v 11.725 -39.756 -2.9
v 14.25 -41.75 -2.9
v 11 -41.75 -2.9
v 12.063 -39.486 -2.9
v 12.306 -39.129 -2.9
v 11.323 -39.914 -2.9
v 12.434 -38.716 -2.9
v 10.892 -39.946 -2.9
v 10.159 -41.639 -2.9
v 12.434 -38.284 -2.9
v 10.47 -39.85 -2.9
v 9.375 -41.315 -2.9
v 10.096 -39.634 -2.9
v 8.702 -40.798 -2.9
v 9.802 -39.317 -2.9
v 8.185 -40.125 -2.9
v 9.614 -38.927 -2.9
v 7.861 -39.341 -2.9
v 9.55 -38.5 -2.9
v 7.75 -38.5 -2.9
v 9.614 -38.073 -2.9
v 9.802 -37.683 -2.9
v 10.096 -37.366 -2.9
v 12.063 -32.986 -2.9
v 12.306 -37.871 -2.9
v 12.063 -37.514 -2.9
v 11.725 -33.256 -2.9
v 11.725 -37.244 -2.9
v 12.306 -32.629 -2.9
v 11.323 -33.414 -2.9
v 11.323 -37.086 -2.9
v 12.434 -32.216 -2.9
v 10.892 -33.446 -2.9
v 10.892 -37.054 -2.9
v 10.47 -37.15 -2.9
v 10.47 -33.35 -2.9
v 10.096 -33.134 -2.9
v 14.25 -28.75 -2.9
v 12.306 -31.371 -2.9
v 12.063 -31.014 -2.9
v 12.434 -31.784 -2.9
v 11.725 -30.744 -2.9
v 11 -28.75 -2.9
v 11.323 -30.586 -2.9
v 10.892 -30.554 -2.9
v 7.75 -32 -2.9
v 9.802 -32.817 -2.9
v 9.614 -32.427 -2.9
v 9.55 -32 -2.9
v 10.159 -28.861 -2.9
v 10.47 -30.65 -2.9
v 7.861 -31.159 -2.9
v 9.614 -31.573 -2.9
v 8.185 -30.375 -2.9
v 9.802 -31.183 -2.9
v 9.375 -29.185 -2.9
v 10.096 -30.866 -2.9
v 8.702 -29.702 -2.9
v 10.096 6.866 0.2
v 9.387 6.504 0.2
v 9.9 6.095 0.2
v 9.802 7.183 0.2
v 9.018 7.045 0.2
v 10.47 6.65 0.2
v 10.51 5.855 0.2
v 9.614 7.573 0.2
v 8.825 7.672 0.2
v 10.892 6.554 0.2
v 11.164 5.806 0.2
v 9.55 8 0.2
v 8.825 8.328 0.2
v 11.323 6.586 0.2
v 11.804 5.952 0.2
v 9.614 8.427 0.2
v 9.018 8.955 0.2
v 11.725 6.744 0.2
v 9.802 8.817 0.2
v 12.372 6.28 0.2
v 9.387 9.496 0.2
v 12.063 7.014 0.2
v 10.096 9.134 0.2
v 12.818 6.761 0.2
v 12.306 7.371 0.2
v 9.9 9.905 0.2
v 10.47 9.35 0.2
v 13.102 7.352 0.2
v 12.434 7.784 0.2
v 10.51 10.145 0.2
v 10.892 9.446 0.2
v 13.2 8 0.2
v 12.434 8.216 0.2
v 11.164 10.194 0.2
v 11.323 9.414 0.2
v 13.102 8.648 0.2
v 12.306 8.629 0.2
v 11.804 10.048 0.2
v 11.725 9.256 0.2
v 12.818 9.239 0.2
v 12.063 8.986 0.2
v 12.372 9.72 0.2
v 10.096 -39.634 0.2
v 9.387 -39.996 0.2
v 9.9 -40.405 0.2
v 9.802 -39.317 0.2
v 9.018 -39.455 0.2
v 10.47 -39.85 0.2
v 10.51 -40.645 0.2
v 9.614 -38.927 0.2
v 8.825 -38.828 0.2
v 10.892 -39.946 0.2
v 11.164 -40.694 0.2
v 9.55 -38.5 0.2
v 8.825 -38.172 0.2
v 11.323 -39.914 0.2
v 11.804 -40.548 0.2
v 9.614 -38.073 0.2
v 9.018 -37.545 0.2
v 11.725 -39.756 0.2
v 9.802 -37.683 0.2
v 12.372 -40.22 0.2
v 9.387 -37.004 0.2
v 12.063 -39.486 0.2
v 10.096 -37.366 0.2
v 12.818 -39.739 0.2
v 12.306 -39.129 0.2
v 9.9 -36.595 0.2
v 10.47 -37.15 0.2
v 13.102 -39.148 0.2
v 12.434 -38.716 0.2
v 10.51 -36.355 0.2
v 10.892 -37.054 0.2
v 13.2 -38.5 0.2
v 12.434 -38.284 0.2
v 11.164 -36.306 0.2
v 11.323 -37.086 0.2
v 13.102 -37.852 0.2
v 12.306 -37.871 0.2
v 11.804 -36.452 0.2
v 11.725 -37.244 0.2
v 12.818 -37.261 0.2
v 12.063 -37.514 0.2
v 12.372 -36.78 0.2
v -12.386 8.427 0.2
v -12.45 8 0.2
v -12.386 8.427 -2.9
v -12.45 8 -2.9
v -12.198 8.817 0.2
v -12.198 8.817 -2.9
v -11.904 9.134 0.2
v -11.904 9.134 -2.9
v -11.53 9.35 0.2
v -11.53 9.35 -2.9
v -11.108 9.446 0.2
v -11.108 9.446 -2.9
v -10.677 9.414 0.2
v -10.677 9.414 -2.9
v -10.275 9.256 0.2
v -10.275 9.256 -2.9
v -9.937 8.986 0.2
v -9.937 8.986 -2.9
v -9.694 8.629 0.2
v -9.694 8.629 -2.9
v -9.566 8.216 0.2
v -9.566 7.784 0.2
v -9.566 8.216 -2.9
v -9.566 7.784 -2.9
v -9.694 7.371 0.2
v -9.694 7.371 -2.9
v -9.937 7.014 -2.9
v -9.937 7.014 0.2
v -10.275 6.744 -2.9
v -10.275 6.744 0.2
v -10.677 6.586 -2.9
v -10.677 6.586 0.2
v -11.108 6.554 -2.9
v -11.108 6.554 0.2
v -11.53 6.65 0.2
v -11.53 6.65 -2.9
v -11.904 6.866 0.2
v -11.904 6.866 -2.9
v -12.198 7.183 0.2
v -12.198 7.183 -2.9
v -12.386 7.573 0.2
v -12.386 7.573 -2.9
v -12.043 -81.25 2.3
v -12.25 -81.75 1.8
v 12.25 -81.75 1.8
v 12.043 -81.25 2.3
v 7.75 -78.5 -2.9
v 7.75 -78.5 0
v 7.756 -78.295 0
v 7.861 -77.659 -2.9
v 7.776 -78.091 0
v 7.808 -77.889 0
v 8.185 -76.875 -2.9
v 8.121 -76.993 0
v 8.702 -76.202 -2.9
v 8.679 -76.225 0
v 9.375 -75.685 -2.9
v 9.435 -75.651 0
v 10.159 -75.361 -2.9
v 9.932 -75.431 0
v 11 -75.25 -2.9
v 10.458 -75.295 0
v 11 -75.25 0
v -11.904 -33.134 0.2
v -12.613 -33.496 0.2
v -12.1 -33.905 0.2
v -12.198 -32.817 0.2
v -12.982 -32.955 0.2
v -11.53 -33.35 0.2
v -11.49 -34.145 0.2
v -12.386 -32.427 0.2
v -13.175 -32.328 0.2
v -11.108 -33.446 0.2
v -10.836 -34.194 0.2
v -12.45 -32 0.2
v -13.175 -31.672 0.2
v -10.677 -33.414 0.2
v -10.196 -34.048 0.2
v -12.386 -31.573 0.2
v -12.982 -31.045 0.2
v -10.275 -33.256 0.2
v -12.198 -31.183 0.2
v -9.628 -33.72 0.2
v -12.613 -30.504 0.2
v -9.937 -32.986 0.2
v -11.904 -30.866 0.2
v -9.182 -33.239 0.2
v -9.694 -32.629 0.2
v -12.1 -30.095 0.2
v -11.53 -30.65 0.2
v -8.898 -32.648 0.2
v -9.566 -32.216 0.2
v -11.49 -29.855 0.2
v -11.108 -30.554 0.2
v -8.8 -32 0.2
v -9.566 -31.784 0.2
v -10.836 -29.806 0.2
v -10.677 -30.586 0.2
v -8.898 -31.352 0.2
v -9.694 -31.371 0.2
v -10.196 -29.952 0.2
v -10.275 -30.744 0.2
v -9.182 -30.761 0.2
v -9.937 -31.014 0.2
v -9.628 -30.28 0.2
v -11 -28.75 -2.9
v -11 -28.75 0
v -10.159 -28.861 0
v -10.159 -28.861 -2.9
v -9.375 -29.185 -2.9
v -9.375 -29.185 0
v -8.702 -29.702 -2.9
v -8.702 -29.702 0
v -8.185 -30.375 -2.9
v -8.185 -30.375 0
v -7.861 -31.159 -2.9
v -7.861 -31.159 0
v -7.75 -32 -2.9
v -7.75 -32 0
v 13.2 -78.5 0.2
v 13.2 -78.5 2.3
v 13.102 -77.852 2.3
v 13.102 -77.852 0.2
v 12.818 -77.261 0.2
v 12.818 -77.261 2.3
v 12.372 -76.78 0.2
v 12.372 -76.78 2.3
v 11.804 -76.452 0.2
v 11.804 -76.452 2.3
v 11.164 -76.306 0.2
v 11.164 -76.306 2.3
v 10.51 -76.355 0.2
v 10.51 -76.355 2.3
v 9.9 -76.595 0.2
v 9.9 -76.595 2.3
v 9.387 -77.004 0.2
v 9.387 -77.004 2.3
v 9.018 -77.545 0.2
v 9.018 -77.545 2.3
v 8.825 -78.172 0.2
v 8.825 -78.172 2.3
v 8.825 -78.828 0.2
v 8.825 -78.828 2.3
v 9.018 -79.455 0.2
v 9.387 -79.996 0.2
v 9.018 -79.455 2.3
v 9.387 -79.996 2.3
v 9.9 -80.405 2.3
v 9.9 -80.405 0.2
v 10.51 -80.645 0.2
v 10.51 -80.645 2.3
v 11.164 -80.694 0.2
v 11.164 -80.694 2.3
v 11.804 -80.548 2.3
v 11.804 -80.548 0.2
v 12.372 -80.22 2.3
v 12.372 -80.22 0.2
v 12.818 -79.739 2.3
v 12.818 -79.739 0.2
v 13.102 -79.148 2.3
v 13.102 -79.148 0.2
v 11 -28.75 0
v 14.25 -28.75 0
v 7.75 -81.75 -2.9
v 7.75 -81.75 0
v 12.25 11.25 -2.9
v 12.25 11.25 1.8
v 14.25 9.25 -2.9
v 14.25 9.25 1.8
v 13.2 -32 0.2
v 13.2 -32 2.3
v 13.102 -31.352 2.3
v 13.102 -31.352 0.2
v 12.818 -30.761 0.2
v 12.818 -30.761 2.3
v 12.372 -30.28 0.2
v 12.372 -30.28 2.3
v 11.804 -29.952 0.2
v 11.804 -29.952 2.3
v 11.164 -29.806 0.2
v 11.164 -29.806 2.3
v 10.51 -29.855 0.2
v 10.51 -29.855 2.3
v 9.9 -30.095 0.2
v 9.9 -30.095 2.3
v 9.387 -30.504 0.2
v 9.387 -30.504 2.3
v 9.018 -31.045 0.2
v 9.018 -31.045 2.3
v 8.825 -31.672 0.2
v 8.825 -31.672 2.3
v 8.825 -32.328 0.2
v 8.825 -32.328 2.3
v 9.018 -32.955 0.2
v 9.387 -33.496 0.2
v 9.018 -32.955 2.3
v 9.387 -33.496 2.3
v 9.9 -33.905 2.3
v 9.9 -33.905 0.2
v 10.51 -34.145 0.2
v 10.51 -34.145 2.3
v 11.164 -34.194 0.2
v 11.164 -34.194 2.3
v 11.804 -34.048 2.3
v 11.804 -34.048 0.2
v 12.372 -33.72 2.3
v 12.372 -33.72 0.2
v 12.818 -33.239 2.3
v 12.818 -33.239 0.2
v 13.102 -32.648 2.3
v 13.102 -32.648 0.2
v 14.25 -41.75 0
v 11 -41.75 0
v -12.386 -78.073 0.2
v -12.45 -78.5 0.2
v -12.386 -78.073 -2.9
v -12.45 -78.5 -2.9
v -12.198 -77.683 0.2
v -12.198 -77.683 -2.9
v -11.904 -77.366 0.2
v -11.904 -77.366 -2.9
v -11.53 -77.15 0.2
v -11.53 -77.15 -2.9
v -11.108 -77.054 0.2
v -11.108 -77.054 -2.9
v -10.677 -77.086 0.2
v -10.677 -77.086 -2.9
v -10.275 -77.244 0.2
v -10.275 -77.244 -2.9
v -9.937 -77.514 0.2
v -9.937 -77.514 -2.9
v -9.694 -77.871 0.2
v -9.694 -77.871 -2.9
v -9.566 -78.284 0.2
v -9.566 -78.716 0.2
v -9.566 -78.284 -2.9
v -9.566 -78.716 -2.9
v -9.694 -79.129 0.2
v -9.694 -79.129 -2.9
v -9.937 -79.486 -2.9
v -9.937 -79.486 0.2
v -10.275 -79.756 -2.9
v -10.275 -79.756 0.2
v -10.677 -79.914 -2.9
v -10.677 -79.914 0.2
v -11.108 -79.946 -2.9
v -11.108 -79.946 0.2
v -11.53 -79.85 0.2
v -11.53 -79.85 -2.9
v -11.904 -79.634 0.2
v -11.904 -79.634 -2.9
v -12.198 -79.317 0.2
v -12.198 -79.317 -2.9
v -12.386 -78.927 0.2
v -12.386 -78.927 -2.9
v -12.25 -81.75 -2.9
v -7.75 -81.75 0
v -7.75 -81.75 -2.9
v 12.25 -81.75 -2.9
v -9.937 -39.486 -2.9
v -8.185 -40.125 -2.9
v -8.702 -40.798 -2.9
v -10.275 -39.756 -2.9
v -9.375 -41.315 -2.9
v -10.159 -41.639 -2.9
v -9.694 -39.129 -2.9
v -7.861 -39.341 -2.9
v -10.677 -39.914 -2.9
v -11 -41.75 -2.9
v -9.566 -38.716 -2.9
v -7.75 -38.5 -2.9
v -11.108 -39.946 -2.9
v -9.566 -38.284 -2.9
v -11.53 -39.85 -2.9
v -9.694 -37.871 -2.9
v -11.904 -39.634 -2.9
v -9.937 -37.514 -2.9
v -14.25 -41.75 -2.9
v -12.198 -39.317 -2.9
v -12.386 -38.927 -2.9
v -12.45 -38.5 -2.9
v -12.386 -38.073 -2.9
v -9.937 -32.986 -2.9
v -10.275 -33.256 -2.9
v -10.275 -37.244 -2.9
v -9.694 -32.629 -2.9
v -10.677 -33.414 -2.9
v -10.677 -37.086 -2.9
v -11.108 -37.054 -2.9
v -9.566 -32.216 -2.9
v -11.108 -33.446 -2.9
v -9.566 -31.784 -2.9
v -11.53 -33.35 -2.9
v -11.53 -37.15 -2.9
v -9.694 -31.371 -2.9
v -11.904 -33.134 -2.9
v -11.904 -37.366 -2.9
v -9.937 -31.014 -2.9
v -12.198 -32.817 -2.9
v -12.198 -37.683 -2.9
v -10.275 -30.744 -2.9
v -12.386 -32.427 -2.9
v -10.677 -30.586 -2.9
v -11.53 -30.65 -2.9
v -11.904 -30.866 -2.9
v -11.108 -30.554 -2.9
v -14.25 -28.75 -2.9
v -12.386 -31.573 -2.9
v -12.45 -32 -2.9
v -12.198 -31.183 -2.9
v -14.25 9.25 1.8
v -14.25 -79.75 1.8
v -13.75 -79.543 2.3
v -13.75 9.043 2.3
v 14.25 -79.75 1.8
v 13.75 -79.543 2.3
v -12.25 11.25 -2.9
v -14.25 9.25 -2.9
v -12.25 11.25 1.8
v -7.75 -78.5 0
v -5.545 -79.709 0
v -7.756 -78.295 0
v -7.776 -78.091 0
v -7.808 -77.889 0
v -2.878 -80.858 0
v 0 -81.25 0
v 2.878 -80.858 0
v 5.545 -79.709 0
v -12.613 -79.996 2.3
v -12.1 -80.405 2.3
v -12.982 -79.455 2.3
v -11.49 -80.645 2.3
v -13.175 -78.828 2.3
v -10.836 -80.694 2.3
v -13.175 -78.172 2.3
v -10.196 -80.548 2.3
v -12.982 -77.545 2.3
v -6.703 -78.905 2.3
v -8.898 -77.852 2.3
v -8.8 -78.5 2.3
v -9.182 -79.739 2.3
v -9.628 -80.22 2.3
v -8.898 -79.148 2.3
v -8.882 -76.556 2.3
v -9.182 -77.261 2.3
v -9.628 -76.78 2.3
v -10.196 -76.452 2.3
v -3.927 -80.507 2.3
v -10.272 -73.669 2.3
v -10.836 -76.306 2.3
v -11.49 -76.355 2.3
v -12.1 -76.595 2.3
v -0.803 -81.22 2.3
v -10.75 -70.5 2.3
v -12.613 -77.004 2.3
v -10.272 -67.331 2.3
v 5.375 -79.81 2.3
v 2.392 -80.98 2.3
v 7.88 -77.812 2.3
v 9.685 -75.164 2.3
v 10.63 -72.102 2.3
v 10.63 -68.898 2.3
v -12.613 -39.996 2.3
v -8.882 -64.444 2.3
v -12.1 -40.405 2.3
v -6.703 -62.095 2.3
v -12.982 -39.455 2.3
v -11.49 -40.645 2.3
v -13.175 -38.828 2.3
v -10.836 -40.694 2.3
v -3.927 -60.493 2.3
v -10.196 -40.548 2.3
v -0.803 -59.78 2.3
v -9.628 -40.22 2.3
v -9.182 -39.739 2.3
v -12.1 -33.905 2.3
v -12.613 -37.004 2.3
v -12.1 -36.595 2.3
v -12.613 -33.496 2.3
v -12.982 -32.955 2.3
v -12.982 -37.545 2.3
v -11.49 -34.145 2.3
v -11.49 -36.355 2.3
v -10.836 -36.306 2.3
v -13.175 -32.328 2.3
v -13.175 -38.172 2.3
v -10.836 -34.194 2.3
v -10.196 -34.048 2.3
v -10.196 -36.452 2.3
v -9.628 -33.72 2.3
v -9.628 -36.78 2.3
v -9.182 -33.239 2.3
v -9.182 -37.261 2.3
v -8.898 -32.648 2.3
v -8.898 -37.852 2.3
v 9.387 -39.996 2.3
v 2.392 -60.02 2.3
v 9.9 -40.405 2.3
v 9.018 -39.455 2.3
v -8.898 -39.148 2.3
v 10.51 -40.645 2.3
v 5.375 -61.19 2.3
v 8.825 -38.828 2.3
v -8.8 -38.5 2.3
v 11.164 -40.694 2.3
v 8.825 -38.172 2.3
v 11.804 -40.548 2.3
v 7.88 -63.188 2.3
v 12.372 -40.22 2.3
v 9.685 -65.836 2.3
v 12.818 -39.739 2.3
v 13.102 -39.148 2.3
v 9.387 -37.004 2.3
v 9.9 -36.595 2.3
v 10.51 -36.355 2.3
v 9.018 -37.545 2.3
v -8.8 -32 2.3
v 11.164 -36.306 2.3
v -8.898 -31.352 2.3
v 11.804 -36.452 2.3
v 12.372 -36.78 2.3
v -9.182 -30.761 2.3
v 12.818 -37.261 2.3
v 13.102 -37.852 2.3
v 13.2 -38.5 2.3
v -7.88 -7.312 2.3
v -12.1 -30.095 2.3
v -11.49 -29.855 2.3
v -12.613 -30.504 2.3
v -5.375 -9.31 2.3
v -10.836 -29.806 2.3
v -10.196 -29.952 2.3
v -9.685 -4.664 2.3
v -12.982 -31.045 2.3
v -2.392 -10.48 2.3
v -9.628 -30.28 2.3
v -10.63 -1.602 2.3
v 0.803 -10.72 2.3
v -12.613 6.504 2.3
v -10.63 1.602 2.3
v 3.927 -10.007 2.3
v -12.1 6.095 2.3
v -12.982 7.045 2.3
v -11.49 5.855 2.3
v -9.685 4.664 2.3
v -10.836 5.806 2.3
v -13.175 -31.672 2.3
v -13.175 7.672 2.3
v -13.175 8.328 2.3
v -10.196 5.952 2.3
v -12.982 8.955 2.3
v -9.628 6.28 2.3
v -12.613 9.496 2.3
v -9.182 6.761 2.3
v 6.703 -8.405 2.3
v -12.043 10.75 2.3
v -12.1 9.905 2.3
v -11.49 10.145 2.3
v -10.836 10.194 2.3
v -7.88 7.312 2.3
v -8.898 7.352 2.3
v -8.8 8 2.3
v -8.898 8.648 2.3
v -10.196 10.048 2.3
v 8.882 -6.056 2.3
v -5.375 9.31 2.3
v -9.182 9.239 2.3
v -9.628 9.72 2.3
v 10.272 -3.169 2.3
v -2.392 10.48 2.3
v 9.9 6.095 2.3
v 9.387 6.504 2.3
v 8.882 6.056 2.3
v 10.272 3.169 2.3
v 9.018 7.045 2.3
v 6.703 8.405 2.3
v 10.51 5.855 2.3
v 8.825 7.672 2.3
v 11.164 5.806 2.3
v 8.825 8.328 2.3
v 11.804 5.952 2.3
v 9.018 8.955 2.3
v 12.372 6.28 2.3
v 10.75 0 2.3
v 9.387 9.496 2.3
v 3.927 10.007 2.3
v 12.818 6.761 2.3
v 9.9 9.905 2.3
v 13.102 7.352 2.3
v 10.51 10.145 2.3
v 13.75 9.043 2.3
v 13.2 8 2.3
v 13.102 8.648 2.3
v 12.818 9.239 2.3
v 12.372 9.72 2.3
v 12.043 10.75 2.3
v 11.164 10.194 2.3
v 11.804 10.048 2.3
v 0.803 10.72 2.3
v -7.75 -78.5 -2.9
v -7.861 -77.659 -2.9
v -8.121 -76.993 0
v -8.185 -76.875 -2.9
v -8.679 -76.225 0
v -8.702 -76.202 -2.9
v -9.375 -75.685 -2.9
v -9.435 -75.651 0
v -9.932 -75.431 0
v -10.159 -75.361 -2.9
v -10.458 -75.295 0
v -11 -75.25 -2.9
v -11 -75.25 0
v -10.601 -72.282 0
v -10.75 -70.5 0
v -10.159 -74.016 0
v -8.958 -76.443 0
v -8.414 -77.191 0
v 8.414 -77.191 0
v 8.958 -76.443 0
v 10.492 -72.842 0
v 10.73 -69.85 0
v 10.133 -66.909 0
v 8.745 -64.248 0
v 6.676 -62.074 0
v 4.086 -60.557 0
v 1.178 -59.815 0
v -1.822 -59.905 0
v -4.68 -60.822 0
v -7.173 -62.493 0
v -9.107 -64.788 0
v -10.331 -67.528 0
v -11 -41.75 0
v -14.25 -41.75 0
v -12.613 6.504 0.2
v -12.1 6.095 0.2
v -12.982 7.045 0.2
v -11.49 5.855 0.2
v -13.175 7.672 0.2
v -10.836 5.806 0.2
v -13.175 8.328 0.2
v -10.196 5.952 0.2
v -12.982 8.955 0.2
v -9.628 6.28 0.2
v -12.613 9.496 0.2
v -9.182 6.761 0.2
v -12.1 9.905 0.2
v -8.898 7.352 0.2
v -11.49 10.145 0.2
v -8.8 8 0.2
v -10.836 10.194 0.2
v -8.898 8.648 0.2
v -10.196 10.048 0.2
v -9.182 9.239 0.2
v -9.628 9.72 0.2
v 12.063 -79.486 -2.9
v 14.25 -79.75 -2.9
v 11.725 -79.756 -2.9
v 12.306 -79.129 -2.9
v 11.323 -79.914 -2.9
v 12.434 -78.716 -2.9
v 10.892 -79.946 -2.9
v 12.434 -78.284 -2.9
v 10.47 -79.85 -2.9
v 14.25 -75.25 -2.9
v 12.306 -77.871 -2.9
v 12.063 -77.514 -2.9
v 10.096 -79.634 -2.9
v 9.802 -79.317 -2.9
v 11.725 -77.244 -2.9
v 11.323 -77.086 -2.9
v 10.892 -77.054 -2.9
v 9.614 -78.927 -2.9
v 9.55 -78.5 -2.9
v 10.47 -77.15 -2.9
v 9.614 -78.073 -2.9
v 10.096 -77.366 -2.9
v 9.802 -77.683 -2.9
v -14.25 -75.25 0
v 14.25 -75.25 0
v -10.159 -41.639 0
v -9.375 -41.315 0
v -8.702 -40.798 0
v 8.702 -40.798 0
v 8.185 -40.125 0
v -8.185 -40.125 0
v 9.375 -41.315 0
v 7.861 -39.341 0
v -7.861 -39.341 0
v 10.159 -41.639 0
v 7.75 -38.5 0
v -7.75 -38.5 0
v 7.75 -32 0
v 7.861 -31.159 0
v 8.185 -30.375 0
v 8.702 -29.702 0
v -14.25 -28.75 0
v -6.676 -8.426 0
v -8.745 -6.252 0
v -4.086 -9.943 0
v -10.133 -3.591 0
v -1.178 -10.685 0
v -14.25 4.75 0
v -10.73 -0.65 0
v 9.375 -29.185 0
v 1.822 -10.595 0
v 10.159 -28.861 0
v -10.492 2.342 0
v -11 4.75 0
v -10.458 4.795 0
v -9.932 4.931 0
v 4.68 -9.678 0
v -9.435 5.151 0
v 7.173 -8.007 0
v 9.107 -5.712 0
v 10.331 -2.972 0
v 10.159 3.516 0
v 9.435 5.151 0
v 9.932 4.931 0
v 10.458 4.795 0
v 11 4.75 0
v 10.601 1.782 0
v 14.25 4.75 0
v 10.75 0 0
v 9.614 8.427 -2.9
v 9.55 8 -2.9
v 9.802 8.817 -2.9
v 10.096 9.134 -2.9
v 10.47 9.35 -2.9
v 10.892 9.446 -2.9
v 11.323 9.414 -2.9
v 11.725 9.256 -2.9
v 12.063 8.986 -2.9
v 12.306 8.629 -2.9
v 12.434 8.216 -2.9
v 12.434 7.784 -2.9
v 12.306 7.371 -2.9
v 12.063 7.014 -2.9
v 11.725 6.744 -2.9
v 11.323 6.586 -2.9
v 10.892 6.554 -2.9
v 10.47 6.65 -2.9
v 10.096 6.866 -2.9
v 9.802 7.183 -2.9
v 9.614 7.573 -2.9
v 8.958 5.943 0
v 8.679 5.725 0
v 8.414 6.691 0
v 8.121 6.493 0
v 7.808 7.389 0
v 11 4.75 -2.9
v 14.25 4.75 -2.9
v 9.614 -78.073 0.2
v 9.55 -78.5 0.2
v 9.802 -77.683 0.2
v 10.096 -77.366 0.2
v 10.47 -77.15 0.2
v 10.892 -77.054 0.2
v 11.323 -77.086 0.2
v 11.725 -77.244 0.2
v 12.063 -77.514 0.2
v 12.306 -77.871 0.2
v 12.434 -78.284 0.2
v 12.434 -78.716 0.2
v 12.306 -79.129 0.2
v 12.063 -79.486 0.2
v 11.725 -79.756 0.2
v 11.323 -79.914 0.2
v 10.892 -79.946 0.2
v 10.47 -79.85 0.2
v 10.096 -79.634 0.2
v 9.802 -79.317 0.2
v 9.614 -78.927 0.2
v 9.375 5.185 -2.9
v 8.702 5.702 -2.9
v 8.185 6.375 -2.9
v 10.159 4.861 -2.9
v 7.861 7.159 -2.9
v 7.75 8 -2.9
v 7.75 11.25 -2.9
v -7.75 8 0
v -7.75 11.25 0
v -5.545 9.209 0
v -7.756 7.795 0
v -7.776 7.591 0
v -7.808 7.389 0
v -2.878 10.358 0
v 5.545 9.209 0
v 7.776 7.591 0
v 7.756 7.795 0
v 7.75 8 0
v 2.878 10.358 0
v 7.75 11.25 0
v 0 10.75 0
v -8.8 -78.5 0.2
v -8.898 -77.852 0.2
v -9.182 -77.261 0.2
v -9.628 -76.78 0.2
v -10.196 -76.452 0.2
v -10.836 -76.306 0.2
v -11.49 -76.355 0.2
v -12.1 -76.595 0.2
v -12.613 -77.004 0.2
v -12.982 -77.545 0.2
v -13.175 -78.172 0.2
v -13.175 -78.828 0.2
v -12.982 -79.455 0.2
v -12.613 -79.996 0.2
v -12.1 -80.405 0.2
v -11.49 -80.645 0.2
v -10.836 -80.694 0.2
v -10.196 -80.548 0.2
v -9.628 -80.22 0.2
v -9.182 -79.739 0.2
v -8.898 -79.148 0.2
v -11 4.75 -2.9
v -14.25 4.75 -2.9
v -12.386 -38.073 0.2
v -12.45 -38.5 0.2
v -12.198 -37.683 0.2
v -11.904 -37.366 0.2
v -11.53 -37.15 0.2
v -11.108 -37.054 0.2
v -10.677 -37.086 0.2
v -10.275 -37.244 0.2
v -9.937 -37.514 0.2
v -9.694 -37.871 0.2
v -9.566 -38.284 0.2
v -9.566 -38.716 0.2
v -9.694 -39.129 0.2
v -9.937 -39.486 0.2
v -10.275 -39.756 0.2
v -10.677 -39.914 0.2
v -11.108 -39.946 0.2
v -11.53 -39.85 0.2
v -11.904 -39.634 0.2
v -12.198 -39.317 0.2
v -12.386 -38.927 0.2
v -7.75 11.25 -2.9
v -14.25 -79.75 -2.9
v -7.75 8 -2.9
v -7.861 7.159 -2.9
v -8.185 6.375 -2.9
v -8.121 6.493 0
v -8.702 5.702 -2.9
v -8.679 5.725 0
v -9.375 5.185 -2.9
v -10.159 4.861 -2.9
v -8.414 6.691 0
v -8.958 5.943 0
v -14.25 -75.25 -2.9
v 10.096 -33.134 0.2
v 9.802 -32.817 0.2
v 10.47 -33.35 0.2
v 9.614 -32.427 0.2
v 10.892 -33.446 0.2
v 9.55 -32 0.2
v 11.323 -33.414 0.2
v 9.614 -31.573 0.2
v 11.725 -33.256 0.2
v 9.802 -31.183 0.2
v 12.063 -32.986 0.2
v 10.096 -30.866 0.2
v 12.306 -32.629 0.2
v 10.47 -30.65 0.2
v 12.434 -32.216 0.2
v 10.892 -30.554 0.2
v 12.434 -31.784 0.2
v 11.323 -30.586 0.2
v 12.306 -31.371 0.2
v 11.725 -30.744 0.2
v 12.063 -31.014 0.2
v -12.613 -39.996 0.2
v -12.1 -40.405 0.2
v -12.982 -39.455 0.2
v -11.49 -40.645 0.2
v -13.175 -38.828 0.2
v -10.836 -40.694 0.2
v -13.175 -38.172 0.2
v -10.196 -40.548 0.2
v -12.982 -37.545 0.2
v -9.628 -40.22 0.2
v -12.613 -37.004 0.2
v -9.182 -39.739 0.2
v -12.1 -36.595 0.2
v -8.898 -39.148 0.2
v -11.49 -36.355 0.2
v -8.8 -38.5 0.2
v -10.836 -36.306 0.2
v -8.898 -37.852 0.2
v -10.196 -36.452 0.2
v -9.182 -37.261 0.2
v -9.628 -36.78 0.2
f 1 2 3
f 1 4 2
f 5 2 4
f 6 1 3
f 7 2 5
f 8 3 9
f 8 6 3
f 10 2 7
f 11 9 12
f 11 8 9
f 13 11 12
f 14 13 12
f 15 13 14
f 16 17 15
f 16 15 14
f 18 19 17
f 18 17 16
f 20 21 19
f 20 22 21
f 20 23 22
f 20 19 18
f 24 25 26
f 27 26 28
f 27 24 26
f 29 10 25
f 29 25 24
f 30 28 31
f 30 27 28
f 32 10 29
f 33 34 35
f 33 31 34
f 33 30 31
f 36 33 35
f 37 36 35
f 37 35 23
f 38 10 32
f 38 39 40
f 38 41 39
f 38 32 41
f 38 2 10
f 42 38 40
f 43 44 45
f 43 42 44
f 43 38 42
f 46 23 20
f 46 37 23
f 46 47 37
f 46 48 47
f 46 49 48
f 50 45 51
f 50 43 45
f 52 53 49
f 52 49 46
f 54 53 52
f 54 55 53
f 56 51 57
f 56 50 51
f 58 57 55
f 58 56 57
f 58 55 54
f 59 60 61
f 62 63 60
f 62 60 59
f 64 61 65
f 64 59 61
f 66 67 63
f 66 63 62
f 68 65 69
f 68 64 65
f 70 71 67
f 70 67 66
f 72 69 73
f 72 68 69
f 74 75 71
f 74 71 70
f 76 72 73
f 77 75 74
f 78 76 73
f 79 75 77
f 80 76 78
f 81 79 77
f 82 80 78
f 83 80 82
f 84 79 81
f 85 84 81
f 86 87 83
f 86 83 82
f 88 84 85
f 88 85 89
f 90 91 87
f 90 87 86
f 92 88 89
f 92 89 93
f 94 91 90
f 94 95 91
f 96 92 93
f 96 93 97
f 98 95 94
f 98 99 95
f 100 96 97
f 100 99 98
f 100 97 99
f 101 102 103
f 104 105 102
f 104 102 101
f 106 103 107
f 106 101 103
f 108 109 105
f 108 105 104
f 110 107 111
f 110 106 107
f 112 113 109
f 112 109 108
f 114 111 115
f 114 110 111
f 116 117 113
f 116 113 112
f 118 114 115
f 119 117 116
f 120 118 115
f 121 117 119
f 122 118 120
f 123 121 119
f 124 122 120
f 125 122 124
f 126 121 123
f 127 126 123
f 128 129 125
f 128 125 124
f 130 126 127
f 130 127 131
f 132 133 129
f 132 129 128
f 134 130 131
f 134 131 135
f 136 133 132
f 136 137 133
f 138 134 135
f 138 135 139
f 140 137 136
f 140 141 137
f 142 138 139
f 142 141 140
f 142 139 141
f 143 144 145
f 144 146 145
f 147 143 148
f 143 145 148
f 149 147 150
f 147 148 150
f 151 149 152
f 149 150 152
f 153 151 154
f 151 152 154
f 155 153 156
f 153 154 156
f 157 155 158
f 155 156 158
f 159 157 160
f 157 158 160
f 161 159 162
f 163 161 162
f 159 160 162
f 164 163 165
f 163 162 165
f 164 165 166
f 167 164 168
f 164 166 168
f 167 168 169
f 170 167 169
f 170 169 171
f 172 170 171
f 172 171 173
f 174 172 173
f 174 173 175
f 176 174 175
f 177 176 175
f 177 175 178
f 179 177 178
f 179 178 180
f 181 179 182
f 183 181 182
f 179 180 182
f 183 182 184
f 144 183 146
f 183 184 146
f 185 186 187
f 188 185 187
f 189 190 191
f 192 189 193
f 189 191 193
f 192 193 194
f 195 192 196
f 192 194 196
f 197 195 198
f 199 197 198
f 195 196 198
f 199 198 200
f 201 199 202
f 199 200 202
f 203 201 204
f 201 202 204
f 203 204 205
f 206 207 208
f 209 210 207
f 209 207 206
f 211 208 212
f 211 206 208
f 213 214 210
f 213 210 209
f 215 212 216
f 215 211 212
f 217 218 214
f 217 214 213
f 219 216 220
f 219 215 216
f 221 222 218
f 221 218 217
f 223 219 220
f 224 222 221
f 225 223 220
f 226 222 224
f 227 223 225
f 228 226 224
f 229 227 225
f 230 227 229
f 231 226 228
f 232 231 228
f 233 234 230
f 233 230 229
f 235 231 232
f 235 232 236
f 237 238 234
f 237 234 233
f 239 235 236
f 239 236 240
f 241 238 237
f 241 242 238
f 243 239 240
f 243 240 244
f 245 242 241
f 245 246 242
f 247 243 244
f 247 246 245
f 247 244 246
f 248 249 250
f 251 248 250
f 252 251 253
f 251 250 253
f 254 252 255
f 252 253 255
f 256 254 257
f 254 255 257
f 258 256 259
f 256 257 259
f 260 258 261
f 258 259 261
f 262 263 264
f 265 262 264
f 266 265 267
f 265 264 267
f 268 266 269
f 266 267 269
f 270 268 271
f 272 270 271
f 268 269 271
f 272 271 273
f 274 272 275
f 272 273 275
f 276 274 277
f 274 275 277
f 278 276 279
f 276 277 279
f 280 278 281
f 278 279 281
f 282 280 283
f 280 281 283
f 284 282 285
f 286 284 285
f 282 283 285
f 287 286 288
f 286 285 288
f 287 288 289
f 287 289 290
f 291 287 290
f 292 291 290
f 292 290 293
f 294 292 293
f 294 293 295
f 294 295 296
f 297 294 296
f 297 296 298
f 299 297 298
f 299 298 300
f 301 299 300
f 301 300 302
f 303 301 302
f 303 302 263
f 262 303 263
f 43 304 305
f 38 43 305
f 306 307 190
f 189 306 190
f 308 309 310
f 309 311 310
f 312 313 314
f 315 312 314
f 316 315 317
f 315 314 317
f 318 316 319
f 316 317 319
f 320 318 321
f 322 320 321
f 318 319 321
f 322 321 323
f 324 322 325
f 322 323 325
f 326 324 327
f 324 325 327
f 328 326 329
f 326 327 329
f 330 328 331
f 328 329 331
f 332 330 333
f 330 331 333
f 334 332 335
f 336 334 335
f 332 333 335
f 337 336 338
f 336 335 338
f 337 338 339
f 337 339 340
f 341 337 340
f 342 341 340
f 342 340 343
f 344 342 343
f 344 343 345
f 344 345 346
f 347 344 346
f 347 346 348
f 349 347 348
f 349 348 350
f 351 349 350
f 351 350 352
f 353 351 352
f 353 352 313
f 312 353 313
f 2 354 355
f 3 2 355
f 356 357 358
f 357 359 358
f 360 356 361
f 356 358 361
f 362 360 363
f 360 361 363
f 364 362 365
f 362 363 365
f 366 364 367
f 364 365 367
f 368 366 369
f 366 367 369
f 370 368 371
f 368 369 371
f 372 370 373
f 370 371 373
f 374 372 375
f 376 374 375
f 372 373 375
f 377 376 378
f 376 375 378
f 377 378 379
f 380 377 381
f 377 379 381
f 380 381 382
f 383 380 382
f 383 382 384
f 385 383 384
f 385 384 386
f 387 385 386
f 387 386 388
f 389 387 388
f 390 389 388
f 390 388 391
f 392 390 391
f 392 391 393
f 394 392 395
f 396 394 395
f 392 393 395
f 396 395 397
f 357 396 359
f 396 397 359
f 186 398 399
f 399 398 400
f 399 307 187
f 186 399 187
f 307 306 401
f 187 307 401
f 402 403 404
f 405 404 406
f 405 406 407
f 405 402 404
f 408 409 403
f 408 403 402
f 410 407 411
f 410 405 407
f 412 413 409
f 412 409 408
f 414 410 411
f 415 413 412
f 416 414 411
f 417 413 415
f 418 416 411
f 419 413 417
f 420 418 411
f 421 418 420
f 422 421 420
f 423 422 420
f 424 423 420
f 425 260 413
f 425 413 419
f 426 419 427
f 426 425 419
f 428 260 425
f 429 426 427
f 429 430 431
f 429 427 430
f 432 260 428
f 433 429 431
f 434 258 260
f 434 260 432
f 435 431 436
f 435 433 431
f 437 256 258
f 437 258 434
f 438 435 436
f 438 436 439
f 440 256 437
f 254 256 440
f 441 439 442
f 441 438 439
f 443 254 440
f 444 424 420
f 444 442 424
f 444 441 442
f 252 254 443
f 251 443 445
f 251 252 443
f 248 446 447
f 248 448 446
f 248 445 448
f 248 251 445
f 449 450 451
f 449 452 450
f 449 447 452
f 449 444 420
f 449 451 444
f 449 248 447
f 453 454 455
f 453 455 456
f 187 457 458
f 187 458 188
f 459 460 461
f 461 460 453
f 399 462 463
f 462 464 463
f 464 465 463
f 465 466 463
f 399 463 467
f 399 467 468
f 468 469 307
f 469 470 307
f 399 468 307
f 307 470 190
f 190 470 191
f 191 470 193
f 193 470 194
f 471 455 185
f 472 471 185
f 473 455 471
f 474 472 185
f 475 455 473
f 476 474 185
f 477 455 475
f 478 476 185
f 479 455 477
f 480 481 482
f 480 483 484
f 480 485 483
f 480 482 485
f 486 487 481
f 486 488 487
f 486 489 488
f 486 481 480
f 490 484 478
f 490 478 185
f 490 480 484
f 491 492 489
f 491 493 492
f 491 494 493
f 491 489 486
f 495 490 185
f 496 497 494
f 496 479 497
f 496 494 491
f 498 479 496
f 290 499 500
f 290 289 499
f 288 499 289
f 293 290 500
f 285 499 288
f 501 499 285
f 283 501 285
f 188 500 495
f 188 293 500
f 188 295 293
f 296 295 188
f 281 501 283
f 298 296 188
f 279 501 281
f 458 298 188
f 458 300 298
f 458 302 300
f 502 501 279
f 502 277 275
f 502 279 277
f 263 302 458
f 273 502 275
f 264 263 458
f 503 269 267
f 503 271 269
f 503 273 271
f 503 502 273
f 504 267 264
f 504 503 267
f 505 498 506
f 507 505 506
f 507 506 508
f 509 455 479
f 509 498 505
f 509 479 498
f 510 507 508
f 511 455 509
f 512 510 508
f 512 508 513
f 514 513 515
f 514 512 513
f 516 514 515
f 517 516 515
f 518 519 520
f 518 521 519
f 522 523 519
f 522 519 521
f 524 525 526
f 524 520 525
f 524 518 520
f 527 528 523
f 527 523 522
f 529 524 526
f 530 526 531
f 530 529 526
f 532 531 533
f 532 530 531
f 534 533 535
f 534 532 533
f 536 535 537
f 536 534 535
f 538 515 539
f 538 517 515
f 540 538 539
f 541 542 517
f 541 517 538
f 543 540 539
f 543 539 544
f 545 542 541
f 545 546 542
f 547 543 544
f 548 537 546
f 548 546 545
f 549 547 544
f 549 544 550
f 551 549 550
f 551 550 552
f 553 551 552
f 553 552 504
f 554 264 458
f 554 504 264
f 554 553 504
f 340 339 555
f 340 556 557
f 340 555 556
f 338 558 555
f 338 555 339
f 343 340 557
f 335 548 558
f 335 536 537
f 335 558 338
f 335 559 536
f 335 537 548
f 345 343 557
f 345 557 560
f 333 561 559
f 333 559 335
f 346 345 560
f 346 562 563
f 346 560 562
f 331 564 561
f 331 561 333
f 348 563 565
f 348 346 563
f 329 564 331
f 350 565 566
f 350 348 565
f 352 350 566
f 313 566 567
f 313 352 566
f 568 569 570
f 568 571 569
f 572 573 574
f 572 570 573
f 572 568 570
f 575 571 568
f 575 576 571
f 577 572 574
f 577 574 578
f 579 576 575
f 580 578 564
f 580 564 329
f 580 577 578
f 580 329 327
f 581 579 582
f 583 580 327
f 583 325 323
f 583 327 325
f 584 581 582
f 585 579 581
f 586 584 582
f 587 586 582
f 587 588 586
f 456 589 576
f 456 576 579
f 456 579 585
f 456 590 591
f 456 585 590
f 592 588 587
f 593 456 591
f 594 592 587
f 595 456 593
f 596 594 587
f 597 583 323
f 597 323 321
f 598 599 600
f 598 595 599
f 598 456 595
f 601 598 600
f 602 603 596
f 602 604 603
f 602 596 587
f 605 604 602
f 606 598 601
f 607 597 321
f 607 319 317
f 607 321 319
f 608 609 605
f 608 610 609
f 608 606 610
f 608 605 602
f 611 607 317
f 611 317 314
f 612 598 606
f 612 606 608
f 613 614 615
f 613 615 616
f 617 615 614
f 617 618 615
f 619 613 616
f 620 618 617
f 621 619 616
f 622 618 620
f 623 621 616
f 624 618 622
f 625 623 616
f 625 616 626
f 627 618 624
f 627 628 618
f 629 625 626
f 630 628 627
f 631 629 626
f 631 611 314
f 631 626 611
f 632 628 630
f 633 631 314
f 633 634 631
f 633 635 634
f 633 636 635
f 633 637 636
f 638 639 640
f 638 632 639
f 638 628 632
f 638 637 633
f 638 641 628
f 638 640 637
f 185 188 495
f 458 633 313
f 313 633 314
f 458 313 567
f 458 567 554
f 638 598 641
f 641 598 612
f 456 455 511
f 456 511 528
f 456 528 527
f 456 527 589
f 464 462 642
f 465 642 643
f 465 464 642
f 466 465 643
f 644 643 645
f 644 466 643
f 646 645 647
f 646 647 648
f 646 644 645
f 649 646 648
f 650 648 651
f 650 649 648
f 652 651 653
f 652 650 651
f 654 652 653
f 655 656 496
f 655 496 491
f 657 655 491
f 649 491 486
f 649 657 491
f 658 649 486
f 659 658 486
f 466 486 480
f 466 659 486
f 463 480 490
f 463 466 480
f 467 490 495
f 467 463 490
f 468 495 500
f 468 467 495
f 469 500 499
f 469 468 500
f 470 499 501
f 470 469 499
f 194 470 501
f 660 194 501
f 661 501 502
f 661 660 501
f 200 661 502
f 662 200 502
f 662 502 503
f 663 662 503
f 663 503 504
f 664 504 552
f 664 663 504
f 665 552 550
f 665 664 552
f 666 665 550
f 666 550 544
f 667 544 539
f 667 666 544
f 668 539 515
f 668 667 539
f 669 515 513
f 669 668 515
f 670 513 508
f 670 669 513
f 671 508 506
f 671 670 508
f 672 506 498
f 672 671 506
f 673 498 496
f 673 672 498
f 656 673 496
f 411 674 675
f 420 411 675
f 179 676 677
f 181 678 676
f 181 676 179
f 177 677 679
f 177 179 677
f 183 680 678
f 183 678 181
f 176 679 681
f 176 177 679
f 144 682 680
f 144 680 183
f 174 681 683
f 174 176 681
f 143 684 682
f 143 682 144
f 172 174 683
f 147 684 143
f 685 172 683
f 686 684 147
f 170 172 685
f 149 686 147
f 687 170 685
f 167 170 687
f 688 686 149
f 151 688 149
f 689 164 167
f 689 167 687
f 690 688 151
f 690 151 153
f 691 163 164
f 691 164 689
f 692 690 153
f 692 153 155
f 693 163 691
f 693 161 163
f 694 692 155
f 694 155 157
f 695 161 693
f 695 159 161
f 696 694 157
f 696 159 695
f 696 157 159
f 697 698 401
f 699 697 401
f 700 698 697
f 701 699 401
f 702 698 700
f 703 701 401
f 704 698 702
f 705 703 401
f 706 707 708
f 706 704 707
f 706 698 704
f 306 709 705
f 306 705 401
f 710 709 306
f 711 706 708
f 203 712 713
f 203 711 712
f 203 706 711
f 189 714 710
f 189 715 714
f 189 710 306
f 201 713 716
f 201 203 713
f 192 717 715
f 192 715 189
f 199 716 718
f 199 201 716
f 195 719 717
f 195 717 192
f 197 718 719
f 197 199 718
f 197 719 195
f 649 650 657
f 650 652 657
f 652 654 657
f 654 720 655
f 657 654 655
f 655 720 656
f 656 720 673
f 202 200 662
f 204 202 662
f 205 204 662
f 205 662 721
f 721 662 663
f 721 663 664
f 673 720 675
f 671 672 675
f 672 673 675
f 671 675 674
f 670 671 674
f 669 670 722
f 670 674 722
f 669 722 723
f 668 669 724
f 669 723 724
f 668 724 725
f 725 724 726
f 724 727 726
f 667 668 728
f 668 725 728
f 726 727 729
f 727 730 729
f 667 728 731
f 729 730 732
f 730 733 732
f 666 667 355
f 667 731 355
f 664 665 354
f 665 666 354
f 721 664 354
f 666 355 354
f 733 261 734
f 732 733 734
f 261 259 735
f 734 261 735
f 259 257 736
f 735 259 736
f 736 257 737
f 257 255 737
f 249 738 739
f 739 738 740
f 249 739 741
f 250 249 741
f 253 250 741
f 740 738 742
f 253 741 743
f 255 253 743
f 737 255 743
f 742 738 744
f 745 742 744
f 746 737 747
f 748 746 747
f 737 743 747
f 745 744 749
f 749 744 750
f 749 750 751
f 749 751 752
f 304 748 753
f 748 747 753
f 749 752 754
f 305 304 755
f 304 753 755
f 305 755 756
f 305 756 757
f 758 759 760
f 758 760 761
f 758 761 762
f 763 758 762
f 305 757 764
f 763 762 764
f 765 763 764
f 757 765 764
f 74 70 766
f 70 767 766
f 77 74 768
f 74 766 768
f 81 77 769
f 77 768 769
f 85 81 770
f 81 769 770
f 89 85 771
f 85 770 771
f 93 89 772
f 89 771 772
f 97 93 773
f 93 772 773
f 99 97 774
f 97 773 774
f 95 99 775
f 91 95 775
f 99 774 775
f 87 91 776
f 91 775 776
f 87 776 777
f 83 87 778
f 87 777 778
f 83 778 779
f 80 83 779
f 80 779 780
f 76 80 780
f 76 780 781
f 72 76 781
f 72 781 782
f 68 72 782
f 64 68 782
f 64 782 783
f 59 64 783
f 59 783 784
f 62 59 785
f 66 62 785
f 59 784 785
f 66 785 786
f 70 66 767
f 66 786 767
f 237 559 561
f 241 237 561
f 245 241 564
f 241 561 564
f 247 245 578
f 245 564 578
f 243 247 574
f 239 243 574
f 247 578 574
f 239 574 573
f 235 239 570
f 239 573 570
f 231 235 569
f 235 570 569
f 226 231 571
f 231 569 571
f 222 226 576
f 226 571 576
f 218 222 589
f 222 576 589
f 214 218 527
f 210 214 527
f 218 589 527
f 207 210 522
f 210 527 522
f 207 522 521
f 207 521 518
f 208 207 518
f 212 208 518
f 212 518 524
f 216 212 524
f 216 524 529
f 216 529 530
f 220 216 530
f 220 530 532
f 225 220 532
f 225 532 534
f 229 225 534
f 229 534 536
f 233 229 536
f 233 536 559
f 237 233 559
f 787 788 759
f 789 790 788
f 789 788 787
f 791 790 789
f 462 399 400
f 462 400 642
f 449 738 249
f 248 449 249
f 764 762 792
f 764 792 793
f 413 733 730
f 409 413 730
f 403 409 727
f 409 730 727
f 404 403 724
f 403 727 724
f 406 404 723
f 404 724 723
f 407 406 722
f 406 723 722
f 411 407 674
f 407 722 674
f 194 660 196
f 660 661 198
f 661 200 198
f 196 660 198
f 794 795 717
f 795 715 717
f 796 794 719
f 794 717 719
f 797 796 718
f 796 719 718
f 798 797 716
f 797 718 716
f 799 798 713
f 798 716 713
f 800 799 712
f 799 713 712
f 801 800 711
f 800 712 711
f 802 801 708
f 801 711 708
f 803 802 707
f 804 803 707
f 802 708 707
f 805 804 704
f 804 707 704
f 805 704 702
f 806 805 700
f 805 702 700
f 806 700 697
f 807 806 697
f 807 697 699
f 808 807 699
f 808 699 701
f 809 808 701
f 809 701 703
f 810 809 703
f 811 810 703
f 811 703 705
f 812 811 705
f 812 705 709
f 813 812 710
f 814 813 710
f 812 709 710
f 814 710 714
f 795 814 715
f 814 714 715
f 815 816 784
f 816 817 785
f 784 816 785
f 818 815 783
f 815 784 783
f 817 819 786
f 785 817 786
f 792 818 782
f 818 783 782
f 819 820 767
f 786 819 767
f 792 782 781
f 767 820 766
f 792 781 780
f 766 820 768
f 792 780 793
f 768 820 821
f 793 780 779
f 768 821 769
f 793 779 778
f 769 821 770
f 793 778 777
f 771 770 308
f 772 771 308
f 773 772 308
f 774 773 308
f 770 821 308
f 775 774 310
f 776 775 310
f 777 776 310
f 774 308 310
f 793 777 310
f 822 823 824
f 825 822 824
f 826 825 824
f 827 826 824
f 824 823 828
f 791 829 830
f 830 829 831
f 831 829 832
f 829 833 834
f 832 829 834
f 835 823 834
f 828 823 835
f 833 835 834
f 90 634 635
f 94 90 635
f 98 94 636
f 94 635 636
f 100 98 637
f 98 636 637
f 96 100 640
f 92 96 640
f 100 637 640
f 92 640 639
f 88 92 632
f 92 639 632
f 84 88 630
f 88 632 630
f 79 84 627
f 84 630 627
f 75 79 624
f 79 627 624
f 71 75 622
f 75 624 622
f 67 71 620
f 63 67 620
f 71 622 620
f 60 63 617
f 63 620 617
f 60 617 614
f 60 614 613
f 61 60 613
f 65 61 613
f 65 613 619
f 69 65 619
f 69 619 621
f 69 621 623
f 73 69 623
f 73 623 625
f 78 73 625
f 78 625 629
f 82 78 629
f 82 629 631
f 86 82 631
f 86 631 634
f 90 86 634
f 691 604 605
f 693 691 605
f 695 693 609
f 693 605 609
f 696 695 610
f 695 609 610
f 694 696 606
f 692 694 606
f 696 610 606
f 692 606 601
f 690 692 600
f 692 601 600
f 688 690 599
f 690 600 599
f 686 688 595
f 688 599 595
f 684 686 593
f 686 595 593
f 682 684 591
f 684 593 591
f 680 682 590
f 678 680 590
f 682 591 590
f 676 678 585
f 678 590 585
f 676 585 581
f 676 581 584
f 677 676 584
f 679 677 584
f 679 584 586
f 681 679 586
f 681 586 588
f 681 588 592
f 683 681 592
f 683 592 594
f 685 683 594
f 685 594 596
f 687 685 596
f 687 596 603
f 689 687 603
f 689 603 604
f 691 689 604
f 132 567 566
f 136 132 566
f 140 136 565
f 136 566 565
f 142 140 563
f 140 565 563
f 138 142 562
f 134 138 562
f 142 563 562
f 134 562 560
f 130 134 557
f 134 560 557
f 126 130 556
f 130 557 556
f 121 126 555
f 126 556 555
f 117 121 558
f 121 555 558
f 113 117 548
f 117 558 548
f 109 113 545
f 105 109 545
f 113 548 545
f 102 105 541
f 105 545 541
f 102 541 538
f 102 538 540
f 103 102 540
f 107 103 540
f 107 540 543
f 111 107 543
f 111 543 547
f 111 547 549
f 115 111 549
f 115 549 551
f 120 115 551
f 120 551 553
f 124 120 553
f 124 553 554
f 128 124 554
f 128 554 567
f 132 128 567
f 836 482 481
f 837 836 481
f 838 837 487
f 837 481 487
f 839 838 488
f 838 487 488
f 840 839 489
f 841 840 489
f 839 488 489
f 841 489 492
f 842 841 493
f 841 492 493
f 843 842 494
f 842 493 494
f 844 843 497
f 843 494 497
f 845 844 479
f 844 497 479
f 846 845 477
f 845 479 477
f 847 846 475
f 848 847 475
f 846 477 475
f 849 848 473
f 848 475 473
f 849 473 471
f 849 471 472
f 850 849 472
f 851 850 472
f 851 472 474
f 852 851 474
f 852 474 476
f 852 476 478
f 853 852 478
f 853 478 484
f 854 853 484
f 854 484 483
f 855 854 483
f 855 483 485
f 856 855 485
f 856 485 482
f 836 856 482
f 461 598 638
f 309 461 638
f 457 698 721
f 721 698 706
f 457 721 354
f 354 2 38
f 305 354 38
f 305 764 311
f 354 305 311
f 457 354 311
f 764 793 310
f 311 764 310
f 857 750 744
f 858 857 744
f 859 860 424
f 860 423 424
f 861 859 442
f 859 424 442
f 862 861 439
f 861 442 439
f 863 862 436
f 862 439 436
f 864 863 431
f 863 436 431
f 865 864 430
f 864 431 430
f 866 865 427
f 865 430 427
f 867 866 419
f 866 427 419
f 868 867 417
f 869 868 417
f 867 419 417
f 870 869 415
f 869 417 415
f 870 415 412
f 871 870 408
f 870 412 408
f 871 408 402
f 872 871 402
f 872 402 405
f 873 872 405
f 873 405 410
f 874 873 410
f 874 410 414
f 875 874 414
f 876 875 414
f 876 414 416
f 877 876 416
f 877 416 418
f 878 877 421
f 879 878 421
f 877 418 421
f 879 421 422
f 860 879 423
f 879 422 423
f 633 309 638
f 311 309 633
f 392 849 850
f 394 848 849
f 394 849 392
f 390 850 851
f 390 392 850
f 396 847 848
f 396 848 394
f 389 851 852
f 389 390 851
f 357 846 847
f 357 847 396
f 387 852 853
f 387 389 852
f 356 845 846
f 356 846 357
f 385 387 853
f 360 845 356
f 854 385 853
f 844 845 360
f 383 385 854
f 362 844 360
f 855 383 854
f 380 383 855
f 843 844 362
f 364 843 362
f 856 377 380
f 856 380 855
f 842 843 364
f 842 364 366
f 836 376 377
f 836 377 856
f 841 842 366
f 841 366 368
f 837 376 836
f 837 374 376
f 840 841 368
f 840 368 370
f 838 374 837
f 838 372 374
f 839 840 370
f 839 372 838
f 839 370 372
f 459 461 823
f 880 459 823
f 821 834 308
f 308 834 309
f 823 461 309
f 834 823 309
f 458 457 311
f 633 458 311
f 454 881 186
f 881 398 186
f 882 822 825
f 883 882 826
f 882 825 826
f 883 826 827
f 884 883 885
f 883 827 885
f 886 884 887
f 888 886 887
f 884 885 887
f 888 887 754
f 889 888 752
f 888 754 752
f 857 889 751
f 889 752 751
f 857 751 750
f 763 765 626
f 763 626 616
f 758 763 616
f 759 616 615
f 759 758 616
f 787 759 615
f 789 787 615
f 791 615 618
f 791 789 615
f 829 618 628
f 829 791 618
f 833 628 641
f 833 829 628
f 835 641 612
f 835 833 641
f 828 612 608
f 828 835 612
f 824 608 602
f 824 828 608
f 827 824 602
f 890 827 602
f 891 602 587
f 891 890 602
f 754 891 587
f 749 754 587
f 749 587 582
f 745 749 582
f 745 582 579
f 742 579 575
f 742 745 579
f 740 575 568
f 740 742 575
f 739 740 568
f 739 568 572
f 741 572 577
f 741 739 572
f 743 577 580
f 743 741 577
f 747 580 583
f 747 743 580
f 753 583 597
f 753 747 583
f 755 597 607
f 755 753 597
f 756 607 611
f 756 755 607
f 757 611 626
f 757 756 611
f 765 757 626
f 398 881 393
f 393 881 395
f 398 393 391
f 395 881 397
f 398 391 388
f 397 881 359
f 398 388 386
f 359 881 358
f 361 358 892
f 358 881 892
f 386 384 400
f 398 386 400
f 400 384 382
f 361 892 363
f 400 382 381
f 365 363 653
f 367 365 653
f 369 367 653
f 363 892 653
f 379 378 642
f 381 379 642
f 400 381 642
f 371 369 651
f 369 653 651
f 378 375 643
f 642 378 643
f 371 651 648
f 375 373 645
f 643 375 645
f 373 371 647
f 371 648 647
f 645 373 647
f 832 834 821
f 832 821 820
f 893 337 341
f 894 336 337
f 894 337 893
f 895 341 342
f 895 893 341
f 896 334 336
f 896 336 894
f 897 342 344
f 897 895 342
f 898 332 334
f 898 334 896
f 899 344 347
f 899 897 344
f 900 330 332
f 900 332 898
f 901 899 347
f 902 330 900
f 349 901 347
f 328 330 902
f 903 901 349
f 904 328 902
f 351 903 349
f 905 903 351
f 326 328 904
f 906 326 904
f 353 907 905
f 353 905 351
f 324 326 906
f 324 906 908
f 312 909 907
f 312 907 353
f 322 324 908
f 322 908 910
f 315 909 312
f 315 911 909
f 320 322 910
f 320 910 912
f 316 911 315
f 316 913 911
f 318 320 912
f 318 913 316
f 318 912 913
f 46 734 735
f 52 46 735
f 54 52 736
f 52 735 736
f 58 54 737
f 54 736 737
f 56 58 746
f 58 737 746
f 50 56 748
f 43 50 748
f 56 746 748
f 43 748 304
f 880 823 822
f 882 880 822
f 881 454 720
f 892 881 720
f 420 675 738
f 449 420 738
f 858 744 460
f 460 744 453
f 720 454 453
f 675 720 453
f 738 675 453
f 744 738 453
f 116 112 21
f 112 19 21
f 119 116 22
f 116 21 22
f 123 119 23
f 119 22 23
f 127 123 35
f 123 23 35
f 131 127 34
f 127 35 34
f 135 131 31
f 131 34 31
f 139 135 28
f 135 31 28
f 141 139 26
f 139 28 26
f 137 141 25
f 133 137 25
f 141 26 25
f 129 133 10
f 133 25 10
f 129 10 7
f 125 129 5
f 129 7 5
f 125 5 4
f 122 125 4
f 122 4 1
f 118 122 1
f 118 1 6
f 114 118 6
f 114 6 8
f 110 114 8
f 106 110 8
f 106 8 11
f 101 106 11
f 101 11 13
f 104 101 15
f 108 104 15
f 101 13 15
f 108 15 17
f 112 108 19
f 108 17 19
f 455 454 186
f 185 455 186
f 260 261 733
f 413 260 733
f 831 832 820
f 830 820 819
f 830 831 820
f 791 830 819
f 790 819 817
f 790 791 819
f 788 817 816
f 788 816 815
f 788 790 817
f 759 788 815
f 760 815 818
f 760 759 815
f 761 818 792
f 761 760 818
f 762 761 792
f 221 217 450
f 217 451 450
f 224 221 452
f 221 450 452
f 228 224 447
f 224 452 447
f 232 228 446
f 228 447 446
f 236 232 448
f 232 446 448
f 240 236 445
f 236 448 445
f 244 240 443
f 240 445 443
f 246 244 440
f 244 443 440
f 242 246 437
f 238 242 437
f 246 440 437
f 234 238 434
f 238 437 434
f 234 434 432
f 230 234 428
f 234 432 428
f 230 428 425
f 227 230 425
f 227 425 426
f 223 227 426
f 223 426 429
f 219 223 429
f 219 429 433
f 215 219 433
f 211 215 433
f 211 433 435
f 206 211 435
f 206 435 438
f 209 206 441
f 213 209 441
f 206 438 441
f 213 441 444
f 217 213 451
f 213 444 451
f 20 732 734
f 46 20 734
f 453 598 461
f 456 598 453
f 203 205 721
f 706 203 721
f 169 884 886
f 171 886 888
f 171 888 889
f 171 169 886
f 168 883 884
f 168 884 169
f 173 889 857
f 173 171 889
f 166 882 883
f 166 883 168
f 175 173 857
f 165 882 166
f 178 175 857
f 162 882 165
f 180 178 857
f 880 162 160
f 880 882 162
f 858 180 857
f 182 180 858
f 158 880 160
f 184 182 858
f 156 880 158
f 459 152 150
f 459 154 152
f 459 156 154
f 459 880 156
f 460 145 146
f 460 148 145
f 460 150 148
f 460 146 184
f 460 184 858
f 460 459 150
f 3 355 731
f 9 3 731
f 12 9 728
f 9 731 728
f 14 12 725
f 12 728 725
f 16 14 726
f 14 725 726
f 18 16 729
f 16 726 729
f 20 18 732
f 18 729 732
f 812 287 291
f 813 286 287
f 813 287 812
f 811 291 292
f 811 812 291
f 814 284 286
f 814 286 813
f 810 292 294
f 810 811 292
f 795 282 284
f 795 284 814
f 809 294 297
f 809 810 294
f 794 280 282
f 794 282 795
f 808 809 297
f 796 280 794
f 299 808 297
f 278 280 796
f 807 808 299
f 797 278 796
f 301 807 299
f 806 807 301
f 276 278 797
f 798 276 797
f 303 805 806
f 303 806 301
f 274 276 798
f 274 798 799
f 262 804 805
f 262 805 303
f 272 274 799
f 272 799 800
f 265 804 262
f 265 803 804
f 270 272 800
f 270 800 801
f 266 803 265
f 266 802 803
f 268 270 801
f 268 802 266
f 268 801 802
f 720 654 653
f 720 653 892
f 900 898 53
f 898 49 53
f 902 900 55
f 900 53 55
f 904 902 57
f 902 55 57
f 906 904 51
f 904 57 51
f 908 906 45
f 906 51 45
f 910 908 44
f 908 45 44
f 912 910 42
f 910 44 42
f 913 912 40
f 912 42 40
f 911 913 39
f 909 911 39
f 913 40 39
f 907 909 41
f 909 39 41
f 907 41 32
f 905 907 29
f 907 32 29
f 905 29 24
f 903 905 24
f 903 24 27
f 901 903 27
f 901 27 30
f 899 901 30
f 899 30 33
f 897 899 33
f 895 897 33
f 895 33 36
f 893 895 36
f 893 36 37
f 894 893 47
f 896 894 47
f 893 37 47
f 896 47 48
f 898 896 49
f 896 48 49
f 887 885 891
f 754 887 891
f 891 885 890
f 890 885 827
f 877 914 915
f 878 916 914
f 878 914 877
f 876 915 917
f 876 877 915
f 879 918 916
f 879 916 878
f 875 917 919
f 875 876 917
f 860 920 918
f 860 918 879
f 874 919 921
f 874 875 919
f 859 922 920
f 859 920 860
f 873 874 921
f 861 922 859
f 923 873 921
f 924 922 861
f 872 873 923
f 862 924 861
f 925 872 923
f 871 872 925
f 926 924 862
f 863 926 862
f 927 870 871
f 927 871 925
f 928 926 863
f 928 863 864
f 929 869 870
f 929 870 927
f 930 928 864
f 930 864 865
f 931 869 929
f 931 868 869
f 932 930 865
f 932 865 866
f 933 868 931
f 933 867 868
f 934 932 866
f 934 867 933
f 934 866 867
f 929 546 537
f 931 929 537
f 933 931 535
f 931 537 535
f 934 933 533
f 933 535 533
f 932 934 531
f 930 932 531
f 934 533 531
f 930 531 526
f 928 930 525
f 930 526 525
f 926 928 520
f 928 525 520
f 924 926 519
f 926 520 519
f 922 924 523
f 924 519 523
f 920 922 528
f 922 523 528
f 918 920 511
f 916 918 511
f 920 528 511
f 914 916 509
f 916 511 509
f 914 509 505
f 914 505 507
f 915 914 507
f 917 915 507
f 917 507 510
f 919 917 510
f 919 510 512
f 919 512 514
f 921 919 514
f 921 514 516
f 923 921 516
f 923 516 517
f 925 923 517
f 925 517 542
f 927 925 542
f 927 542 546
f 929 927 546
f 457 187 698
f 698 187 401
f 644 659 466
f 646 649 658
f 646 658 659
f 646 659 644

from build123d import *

# Parameters (mm, degrees)
SKETCH2_W                                  = 28.5
SKETCH2_H                                  = 93
SKETCH2_R                                  = 10.75
BOSS_EXTRUDE1_DEPTH                        = 2.3
BOSS_EXTRUDE2_DEPTH                        = 2.9
CBORE_FOR_M2_5_PAN_HEAD_SCREW1_D           = 2.9
CBORE_FOR_M2_5_PAN_HEAD_SCREW1_DEPTH       = 8
CBORE_FOR_M2_5_PAN_HEAD_SCREW1_CBORE_D     = 4.4
CBORE_FOR_M2_5_PAN_HEAD_SCREW1_CBORE_DEPTH = 2.1
CBORE_FOR_M2_5_PAN_HEAD_SCREW1_TIP         = 0.871247898
CHAMFER1_SIZE                              = 2
CHAMFER2_SIZE                              = 0.5


with BuildPart() as part:
    # Sketch2 → Boss-Extrude1 (new body)
    with BuildSketch(Plane.XY):
        with Locations((0, -35.25)):
            Rectangle(SKETCH2_W, SKETCH2_H)
        Circle(SKETCH2_R, mode=Mode.SUBTRACT)
        with Locations(Location((0, -70.5, 0), (0, 0, 180))):
            Circle(SKETCH2_R, mode=Mode.SUBTRACT)
    extrude(amount=BOSS_EXTRUDE1_DEPTH)

    # Sketch3 → Boss-Extrude2 (add)
    with BuildSketch(Plane(origin=(0, 0, 0), x_dir=(-1, 0, 0), z_dir=(0, 0, -1))):
        with BuildLine():
            Line((7.75, 11.25), (7.75, 8))
            ThreePointArc((7.75, 8), (8.701902961, 5.701902961), (11, 4.75))
            Line((11, 4.75), (14.25, 4.75))
            Line((14.25, 4.75), (14.25, 11.25))
            Line((14.25, 11.25), (7.75, 11.25))
        make_face()
        with BuildLine():
            Line((11, -41.75), (14.25, -41.75))
            Line((14.25, -41.75), (14.25, -28.75))
            Line((14.25, -28.75), (11, -28.75))
            ThreePointArc((11, -28.75), (8.701902961, -29.701902961), (7.75, -32))
            Line((7.75, -32), (7.75, -38.5))
            ThreePointArc((7.75, -38.5), (8.701902961, -40.798097039), (11, -41.75))
        make_face()
        with BuildLine():
            Line((14.25, -81.75), (7.75, -81.75))
            Line((7.75, -81.75), (7.75, -78.5))
            ThreePointArc((7.75, -78.5), (8.701902961, -76.201902961), (11, -75.25))
            Line((11, -75.25), (14.25, -75.25))
            Line((14.25, -75.25), (14.25, -81.75))
        make_face()
        with BuildLine():
            Line((-14.25, 11.25), (-7.75, 11.25))
            Line((-7.75, 11.25), (-7.75, 8))
            ThreePointArc((-7.75, 8), (-8.701902961, 5.701902961), (-11, 4.75))
            Line((-11, 4.75), (-14.25, 4.75))
            Line((-14.25, 4.75), (-14.25, 11.25))
        make_face()
        with BuildLine():
            Line((-7.75, -38.5), (-7.75, -32))
            ThreePointArc((-7.75, -32), (-8.701902961, -29.701902961), (-11, -28.75))
            Line((-11, -28.75), (-14.25, -28.75))
            Line((-14.25, -28.75), (-14.25, -41.75))
            Line((-14.25, -41.75), (-11, -41.75))
            ThreePointArc((-11, -41.75), (-8.701902961, -40.798097039), (-7.75, -38.5))
        make_face()
        with BuildLine():
            Line((-7.75, -81.75), (-7.75, -78.5))
            ThreePointArc((-7.75, -78.5), (-8.701902961, -76.201902961), (-11, -75.25))
            Line((-11, -75.25), (-14.25, -75.25))
            Line((-14.25, -75.25), (-14.25, -81.75))
            Line((-14.25, -81.75), (-7.75, -81.75))
        make_face()
    extrude(amount=BOSS_EXTRUDE2_DEPTH)

    # CBORE for M2.5 Pan Head Screw1
    with Locations(Plane.XY.offset(2.3)):
        with Locations((-11, 8), (11, 8), (11, -32), (-11, -32), (-11, -38.5), (11, -38.5), (11, -78.5), (-11, -78.5)):
            CounterBoreHole(CBORE_FOR_M2_5_PAN_HEAD_SCREW1_D / 2, CBORE_FOR_M2_5_PAN_HEAD_SCREW1_CBORE_D / 2, CBORE_FOR_M2_5_PAN_HEAD_SCREW1_CBORE_DEPTH, depth=CBORE_FOR_M2_5_PAN_HEAD_SCREW1_DEPTH)
            with Locations((0, 0, -(CBORE_FOR_M2_5_PAN_HEAD_SCREW1_DEPTH + CBORE_FOR_M2_5_PAN_HEAD_SCREW1_TIP / 2))):  # 118° drill point
                Cone(0, CBORE_FOR_M2_5_PAN_HEAD_SCREW1_D / 2, CBORE_FOR_M2_5_PAN_HEAD_SCREW1_TIP, mode=Mode.SUBTRACT)

    # Chamfer1
    chamfer1_edges = [part.edges().sort_by_distance(p)[0] for p in [
        (-14.25, 11.25, -0.3),
        (14.25, 11.25, -0.3),
        (14.25, -81.75, -0.3),
        (-14.25, -81.75, -0.3),
    ]]
    chamfer(chamfer1_edges, length=CHAMFER1_SIZE)

    # Chamfer2
    chamfer2_edges = [part.edges().sort_by_distance(p)[0] for p in [
        (0, -81.75, 2.3),
        (-14.25, -35.25, 2.3),
        (14.25, -35.25, 2.3),
        (0, 11.25, 2.3),
        (-13.25, 10.25, 2.3),
        (13.25, 10.25, 2.3),
        (13.25, -80.75, 2.3),
        (-13.25, -80.75, 2.3),
    ]]
    chamfer(chamfer2_edges, length=CHAMFER2_SIZE - 0.0001)  # a hair under: the kernel refuses the full size


solid = part.part
